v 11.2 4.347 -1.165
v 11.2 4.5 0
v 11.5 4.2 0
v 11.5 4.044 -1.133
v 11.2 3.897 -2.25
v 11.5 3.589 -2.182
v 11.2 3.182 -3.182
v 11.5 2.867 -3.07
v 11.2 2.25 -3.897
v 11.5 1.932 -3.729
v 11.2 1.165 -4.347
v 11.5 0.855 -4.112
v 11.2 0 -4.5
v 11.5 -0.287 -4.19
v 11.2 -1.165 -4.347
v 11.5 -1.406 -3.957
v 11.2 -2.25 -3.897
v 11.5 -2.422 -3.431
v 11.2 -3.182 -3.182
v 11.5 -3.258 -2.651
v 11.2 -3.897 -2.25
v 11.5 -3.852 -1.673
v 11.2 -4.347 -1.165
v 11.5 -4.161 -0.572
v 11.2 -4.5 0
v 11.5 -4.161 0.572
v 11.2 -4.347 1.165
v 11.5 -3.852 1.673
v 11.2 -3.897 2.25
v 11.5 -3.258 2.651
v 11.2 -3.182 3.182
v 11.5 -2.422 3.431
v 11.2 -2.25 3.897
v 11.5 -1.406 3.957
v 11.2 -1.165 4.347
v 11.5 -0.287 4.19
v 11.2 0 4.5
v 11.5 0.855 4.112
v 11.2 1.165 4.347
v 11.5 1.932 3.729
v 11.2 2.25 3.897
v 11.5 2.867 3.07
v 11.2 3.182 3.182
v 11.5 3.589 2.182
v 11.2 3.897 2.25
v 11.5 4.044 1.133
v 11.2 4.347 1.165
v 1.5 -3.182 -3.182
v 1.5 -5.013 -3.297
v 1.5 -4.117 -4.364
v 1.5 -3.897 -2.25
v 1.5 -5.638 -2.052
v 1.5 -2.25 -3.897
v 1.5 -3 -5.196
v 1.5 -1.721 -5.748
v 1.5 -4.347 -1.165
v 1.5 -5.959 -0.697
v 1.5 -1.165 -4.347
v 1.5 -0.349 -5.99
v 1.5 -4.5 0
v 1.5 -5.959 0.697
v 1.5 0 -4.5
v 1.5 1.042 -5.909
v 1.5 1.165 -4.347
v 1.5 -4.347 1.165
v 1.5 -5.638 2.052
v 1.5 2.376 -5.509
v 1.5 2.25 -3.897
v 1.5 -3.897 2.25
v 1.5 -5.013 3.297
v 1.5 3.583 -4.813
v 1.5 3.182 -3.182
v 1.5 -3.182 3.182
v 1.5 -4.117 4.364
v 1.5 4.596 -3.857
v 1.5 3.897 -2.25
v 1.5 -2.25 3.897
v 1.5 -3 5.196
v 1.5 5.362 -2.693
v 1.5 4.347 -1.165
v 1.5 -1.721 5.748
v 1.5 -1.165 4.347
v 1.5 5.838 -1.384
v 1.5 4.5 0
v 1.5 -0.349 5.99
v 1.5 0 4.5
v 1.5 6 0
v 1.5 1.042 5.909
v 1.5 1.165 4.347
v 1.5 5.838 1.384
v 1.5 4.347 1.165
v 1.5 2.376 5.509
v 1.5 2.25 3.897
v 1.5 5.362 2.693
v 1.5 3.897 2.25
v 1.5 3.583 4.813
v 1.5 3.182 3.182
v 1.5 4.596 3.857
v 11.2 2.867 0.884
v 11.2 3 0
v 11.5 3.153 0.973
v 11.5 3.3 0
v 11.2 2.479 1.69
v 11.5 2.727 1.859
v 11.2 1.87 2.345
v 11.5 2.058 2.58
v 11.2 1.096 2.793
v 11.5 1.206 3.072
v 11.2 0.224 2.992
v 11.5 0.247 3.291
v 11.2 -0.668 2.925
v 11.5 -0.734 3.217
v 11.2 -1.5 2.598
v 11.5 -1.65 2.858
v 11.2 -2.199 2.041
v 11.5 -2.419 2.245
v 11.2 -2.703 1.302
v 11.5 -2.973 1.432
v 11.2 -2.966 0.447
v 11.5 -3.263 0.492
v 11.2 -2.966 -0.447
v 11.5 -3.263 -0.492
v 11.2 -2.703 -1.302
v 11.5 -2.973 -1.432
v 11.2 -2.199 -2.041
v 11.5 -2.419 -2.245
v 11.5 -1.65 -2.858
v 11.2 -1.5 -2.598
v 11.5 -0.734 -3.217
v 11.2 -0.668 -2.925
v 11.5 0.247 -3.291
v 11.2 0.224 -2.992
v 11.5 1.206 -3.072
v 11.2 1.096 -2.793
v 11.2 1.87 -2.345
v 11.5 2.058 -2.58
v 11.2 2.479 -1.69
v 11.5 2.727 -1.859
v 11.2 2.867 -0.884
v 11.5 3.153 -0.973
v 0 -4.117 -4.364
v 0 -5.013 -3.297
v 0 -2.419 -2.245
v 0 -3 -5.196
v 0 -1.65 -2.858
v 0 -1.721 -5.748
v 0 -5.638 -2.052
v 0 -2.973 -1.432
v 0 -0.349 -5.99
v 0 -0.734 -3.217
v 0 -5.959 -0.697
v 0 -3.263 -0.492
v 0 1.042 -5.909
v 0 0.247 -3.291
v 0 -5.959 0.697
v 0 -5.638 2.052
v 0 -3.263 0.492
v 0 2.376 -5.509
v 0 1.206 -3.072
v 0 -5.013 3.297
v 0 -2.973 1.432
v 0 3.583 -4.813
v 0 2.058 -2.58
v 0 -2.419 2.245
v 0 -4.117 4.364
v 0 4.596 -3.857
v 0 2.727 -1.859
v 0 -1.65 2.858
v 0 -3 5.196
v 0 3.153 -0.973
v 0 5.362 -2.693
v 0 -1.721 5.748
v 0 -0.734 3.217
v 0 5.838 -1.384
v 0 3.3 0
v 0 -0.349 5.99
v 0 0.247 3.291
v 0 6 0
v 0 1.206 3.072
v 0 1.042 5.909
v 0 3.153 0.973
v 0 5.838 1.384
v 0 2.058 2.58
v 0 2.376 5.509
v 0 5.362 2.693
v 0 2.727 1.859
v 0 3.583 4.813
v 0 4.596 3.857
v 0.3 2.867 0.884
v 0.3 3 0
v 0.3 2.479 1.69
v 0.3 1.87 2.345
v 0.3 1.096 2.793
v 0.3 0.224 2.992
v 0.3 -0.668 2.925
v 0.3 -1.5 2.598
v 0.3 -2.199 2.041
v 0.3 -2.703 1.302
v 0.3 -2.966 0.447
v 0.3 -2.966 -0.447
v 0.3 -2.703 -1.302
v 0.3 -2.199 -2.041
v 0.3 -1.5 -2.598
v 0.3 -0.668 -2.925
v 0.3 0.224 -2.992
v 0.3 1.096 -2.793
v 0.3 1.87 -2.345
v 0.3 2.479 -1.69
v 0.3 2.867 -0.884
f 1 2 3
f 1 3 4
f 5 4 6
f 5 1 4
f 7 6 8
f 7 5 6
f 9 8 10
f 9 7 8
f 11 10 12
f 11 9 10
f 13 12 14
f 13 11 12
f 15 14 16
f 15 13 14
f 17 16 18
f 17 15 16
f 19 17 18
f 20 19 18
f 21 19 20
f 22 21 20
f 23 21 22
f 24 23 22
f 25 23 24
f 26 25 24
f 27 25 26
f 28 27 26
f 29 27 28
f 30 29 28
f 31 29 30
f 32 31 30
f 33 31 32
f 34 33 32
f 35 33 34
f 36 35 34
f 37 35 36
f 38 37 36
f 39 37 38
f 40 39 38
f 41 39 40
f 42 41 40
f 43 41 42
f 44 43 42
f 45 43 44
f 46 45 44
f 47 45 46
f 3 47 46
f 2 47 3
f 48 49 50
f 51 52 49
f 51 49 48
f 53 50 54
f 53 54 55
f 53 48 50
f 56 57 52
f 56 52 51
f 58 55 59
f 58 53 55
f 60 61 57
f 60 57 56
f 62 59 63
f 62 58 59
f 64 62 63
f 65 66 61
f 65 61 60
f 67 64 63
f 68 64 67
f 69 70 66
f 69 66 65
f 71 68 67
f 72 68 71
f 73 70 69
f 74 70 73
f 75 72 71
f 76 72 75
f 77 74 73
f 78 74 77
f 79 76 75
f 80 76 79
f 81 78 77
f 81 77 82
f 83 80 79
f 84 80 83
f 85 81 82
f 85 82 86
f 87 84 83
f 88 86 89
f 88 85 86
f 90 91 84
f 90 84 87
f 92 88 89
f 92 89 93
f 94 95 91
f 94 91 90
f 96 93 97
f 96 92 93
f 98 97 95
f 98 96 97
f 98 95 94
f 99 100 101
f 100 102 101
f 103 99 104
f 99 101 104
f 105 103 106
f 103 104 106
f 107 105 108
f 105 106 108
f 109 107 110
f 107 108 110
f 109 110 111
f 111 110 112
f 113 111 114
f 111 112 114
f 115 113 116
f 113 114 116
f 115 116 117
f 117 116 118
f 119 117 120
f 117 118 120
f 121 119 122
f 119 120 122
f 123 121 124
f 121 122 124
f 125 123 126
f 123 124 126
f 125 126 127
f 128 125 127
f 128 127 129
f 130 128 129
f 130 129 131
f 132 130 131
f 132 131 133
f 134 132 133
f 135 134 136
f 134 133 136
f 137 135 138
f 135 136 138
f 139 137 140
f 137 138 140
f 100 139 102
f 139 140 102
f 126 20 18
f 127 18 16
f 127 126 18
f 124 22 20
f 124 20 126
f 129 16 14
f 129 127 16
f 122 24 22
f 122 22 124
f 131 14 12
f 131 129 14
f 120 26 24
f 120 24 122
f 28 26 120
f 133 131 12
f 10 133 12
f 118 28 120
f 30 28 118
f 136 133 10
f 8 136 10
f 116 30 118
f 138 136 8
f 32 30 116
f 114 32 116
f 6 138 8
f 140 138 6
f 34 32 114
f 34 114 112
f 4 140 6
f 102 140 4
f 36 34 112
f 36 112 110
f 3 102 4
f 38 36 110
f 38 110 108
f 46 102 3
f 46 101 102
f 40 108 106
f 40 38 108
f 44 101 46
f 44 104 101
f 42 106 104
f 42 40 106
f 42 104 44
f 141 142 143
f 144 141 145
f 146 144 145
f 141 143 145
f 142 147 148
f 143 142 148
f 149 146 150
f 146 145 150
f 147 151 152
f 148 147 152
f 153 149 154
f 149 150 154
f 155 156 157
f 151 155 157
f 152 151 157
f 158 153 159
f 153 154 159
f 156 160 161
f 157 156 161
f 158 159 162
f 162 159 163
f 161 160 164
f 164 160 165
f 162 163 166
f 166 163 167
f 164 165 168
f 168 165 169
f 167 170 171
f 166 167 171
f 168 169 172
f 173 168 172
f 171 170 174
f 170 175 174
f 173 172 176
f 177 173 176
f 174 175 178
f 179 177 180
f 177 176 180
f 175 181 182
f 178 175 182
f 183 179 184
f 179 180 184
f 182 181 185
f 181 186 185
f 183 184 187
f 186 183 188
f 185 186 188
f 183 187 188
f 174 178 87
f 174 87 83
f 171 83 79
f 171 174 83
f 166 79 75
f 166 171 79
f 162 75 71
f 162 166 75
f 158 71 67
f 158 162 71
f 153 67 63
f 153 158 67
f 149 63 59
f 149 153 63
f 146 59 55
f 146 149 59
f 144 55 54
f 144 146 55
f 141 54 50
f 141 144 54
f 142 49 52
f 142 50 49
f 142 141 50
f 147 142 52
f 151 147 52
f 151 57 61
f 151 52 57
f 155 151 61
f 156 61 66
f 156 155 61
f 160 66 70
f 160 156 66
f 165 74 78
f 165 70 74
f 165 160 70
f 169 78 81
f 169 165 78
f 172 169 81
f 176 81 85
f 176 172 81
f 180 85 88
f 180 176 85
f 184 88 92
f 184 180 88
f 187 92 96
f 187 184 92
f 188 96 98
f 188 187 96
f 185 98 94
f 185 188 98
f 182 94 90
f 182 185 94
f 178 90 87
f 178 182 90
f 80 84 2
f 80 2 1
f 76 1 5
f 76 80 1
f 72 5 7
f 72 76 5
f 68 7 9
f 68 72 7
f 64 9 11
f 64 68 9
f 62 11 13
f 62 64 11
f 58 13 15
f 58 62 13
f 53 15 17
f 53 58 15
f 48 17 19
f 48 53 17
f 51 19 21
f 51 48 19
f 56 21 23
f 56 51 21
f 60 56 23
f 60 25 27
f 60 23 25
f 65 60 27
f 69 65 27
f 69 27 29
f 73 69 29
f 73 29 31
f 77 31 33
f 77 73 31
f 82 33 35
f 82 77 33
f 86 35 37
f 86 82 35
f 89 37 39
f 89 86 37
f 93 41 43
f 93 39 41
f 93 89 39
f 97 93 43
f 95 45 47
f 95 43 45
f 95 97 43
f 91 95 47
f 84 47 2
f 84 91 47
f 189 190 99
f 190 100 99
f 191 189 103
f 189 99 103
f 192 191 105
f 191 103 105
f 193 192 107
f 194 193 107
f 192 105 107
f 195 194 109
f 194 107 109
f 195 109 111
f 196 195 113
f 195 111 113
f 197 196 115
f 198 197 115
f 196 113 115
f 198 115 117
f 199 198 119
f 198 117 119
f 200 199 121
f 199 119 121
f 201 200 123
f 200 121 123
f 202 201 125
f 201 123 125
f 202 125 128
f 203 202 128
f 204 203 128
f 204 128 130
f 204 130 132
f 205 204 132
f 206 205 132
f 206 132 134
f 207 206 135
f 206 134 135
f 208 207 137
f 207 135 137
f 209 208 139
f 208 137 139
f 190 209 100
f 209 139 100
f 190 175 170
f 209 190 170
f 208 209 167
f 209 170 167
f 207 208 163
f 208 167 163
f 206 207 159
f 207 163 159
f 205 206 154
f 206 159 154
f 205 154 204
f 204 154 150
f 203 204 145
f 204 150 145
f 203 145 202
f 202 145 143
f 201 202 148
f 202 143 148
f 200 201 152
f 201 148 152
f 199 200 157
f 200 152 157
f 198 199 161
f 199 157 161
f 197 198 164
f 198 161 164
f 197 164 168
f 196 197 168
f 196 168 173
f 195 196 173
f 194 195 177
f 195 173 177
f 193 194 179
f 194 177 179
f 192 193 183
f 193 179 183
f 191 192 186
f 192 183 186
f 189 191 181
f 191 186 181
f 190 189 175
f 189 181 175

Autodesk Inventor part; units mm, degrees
ref_plane "YZ Plane" through (0, 0, 0) normal (1, 0, 0) x (0, 1, 0)
ref_plane "XZ Plane" through (0, 0, 0) normal (0, 1, 0) x (-1, 0, 0)
ref_plane "XY Plane" through (0, 0, 0) normal (0, 0, 1) x (1, 0, 0)
sketch "Sketch_1" plane through (0, 0, 0) normal (0, 0, 1) x (1, 0, 0)
  line L0 (11.5, 0) -> (0, 0)
  line L1 (0, 6) -> (0, 3.3)
  line L2 (0, 3.3) -> (0.3, 3)
  line L3 (0.3, 3) -> (11.2, 3)
  line L4 (11.2, 3) -> (11.5, 3.3)
  line L5 (11.5, 3.3) -> (11.5, 4.2)
  line L6 (11.5, 4.2) -> (11.2, 4.5)
  line L7 (11.2, 4.5) -> (1.5, 4.5)
  line L8 (1.5, 4.5) -> (1.5, 6)
  line L9 (1.5, 6) -> (0, 6)
revolve "Revolution1" add sketch "Sketch_1" angle 360 about axis through (11.5, 0, 0) along (1, 0, 0)
properties part number "TFZF6-10"
